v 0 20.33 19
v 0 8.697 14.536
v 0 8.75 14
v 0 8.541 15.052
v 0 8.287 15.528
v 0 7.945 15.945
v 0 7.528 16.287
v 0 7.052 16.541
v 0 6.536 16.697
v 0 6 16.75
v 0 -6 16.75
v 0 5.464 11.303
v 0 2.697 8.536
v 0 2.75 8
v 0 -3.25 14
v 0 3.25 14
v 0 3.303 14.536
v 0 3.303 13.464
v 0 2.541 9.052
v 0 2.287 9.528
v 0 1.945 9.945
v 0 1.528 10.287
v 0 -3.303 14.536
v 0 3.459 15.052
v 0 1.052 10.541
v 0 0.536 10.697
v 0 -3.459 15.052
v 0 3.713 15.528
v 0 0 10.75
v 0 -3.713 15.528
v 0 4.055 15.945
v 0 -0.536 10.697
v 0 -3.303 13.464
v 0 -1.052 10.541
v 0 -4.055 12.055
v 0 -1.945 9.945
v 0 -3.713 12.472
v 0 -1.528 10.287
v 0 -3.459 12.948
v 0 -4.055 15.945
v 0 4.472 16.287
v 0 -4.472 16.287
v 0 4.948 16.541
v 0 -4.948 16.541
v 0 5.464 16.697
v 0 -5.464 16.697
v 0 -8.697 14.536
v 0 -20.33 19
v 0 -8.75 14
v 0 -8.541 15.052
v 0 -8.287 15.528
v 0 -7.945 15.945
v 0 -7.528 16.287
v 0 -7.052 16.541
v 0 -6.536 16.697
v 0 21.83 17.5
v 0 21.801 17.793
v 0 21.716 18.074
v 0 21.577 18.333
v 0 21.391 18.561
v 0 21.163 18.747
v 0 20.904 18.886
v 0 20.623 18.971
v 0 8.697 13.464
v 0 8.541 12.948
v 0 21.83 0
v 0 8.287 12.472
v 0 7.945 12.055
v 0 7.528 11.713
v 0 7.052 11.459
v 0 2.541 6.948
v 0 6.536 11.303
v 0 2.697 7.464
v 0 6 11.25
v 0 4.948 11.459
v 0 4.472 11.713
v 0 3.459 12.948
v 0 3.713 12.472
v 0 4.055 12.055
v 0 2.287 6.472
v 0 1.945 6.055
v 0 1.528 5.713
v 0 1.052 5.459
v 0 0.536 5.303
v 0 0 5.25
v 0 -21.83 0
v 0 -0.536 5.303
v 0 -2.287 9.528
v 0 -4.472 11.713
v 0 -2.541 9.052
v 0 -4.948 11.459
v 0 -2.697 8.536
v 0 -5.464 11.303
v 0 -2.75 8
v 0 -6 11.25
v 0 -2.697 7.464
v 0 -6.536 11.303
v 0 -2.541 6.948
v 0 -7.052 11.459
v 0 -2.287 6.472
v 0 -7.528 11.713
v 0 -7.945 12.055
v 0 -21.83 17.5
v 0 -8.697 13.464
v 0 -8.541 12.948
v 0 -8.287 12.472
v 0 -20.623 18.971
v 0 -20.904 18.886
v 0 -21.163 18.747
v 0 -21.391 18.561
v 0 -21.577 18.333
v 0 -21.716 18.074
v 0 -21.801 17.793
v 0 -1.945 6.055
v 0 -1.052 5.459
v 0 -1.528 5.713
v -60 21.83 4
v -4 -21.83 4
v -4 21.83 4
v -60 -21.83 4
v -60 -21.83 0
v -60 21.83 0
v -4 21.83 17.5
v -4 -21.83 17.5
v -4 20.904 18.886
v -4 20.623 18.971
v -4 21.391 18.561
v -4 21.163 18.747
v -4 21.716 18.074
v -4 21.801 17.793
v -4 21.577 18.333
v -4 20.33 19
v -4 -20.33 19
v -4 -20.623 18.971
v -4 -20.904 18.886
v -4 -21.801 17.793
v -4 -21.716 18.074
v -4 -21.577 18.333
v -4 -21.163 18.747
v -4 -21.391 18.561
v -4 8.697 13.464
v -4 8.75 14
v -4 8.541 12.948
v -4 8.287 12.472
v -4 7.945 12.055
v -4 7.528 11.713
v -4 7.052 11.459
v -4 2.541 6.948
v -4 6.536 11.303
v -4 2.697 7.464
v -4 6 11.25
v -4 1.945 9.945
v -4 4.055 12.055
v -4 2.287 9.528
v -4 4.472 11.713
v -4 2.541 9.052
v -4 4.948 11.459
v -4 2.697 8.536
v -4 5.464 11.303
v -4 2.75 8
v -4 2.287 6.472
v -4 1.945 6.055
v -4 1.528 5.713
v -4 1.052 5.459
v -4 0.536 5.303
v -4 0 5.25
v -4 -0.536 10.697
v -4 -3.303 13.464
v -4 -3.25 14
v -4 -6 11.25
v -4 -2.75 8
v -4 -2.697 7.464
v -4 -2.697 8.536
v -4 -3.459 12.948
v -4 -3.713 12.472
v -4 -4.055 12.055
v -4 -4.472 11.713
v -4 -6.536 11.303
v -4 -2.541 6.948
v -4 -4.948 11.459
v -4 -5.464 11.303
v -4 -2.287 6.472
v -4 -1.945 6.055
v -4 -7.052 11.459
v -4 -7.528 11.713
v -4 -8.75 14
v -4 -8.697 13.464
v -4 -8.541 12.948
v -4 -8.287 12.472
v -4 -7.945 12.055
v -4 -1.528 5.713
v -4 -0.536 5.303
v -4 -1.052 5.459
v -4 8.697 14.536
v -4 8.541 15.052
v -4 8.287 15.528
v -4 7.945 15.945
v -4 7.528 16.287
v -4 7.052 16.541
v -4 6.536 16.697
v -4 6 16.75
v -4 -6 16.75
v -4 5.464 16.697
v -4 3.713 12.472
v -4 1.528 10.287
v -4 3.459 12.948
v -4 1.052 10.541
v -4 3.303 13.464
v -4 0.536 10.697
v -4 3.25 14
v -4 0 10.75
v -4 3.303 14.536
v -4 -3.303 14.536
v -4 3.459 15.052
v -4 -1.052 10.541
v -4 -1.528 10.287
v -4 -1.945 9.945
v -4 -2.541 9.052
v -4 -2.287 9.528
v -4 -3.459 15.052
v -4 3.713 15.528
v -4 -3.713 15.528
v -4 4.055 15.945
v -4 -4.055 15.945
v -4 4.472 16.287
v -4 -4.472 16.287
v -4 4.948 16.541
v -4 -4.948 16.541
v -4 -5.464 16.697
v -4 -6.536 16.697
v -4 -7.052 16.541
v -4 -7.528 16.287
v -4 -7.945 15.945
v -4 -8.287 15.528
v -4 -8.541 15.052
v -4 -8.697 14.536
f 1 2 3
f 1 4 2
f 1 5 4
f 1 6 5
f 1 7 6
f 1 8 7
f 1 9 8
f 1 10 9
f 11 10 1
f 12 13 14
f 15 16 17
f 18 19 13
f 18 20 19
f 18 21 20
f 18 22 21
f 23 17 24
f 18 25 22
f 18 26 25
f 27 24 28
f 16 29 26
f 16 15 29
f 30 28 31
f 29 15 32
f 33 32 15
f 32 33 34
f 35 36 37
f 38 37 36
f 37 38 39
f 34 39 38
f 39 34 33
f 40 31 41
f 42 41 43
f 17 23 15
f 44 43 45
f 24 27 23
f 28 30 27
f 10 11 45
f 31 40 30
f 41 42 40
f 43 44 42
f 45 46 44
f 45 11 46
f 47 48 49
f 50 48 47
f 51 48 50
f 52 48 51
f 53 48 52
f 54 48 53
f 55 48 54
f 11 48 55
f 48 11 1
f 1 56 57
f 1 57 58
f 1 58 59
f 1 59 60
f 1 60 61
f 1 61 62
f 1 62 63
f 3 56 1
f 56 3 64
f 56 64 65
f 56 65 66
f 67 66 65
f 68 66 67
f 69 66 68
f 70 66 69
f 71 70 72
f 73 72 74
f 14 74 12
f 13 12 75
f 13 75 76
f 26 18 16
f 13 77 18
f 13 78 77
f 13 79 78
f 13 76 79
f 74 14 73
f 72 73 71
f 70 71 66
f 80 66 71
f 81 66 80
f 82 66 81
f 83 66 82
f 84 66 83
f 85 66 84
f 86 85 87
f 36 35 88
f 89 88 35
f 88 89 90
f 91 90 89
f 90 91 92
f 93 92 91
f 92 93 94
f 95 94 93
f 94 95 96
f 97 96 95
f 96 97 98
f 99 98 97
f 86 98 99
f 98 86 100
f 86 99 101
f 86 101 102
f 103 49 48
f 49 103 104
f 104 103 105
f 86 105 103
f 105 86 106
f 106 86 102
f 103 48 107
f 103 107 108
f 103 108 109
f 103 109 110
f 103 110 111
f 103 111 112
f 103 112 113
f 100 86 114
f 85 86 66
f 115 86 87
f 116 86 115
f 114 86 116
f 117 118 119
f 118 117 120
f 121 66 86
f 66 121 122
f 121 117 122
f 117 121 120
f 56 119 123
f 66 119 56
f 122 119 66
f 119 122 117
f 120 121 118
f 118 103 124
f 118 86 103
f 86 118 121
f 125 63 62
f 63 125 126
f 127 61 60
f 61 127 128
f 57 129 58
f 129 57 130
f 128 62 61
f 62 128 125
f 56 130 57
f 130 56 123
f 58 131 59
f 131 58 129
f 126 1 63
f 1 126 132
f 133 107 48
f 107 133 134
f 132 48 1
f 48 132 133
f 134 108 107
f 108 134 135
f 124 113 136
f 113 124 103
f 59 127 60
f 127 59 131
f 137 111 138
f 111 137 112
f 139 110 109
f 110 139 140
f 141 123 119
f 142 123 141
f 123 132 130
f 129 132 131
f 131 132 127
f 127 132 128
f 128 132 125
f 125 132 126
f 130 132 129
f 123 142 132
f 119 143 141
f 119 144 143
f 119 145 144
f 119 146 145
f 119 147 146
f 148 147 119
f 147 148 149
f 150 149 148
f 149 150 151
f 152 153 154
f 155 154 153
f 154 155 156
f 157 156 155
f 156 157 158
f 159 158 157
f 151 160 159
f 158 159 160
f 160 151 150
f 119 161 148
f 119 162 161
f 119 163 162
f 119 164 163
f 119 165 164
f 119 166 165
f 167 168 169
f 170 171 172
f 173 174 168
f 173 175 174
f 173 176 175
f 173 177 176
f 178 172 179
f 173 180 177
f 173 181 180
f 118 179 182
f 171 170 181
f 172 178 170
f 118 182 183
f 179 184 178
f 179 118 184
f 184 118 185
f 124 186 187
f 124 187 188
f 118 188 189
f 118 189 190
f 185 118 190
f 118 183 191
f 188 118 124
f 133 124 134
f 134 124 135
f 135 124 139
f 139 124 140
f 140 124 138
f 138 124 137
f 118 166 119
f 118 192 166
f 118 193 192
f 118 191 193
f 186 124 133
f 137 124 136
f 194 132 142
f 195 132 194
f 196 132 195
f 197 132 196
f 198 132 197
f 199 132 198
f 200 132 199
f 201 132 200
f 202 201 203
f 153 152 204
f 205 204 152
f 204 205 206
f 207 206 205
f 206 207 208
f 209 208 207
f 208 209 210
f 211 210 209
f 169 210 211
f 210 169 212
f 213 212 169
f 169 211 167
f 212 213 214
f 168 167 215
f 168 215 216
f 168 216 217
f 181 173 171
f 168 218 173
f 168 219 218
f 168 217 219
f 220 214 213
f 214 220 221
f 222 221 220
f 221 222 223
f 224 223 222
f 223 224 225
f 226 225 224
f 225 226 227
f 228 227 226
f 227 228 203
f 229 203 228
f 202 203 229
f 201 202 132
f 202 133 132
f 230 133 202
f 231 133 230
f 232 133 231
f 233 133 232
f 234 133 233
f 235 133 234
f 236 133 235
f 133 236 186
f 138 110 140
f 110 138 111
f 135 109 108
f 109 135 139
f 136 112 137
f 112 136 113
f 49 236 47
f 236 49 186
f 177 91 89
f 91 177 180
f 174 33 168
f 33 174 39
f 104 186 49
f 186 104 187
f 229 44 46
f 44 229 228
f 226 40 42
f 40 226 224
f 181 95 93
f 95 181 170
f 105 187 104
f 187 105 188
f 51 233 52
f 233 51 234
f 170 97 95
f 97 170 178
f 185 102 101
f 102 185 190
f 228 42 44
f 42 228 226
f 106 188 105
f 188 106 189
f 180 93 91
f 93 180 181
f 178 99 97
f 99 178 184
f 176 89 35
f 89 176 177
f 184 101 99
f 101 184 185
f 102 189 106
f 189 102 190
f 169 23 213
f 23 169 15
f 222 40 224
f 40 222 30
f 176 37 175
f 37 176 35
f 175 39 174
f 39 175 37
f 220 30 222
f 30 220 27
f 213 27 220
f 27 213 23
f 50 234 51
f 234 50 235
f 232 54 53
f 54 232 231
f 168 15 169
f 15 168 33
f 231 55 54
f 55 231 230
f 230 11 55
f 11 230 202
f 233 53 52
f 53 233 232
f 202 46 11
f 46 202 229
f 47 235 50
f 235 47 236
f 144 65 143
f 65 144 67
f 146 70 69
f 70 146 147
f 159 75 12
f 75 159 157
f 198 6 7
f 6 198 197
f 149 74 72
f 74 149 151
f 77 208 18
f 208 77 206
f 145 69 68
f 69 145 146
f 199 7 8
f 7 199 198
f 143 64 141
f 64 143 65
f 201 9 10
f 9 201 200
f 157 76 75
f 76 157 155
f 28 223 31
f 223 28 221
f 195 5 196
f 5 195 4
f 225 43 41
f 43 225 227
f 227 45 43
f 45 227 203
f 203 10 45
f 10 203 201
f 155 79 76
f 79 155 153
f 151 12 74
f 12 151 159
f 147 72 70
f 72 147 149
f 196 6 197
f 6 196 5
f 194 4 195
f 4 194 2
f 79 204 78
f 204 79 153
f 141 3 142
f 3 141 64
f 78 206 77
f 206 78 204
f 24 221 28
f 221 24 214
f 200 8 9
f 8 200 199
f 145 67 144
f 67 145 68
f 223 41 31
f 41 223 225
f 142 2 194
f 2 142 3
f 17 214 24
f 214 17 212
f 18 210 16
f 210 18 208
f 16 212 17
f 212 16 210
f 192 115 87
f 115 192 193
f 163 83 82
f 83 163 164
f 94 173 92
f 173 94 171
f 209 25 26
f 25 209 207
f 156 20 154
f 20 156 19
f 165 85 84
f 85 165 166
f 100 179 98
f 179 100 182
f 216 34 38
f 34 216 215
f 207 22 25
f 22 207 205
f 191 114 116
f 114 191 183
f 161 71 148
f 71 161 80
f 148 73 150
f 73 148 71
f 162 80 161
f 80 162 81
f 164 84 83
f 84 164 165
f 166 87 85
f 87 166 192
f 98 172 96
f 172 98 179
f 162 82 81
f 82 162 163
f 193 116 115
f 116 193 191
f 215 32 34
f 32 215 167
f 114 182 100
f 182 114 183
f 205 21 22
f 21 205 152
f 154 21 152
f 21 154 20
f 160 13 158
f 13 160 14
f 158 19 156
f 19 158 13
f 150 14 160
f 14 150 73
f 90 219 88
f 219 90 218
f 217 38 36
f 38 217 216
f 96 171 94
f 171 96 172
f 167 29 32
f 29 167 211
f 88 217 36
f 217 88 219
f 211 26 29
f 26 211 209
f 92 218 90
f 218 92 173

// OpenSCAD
/**
 * Rack Scad - Joiner Examples
 *
 * Dedicated examples file for faceplate joiner brackets.
 * These brackets allow separately printed rack panels to be
 * screwed together using M5 hardware.
 *
 * Screw Pattern: Triangle layout (2 near edge, 1 further back)
 * Hardware: M5 screws (10-16mm) + M5 hex nuts
 *
 * Use the Customizer to select which example to view.
 */

use <components/joiners.scad>

/* [Example Selection] */

// Select which joiner example to display
joiner_example = 1; // [1:Single Left Bracket (1U), 2:Single Right Bracket (1U), 3:Bracket Pair (1U), 4:Assembled View (1U), 5:Exploded View (1U), 6:2U Bracket Pair, 7:2U Assembled, 8:3U Bracket Pair, 9:Bracket Only (no faceplate), 10:All Sizes Comparison, 11:Print Layout - 1U Pair, 12:Print Layout - 2U Pair]

/* [Joiner Parameters] */

// Faceplate section width (mm)
faceplate_width = 60; // [40:10:120]

// Distance from joint edge to bracket (mm)
edge_offset = 5; // [0:1:20]

// Detail level for curves
detail_fn = 32; // [16:Low, 32:Medium, 64:High]


/* [Hide] */
_dummy = 0;


// ============================================================
// EXAMPLE 1: Single Left Bracket (1U)
// The side with screw clearance holes
// ============================================================
module example_single_left_1u()
{
    color("SteelBlue")
        faceplate_joiner_left(
            unit_height = 1,
            faceplate_width = faceplate_width,
            edge_offset = edge_offset,
            include_faceplate = true,
            fn = detail_fn
        );

    // Label
    %translate([0, -35, 0])
        linear_extrude(1)
            text("LEFT (screw side)", size = 4, halign = "center");
}


// ============================================================
// EXAMPLE 2: Single Right Bracket (1U)
// The side with hex nut pockets
// ============================================================
module example_single_right_1u()
{
    color("Coral")
        faceplate_joiner_right(
            unit_height = 1,
            faceplate_width = faceplate_width,
            edge_offset = edge_offset,
            include_faceplate = true,
            fn = detail_fn
        );

    // Label
    %translate([30, -35, 0])
        linear_extrude(1)
            text("RIGHT (nut side)", size = 4, halign = "center");
}


// ============================================================
// EXAMPLE 3: Bracket Pair (1U)
// Both left and right brackets side by side
// ============================================================
module example_pair_1u()
{
    faceplate_joiner_pair(
        unit_height = 1,
        faceplate_width = faceplate_width,
        edge_offset = edge_offset,
        spacing = 15,
        fn = detail_fn
    );

    // Labels
    %translate([-faceplate_width/2 - 5, -35, 0])
        linear_extrude(1)
            text("LEFT", size = 4, halign = "center");

    %translate([faceplate_width/2 + 5, -35, 0])
        linear_extrude(1)
            text("RIGHT", size = 4, halign = "center");

    // Hardware note
    %translate([0, -45, 0])
        linear_extrude(1)
            text("Hardware: 3x M5 screws + 3x M5 hex nuts", size = 3, halign = "center");
}


// ============================================================
// EXAMPLE 4: Assembled View (1U)
// Shows how the brackets mate together
// ============================================================
module example_assembled_1u()
{
    faceplate_joiner_assembled(
        unit_height = 1,
        faceplate_width = faceplate_width,
        edge_offset = edge_offset,
        explode = 0,
        fn = detail_fn
    );

    // Label
    %translate([0, -35, 0])
        linear_extrude(1)
            text("ASSEMBLED - 1U Joint", size = 4, halign = "center");
}


// ============================================================
// EXAMPLE 5: Exploded View (1U)
// Shows assembly with parts separated
// ============================================================
module example_exploded_1u()
{
    faceplate_joiner_assembled(
        unit_height = 1,
        faceplate_width = faceplate_width,
        edge_offset = edge_offset,
        explode = 30,
        fn = detail_fn
    );

    // Assembly arrow
    %translate([0, 0, 25])
        rotate([0, 90, 0])
            cylinder(h = 20, d1 = 8, d2 = 0, center = true, $fn = 16);

    // Label
    %translate([0, -35, 0])
        linear_extrude(1)
            text("EXPLODED VIEW", size = 4, halign = "center");
}


// ============================================================
// EXAMPLE 6: 2U Bracket Pair
// Larger brackets with 6 screws (2 triangles)
// ============================================================
module example_pair_2u()
{
    faceplate_joiner_pair(
        unit_height = 2,
        faceplate_width = faceplate_width,
        edge_offset = edge_offset,
        spacing = 15,
        fn = detail_fn
    );

    // Hardware note
    %translate([0, -60, 0])
        linear_extrude(1)
            text("2U: 6x M5 screws + 6x M5 hex nuts", size = 3, halign = "center");
}


// ============================================================
// EXAMPLE 7: 2U Assembled
// Shows assembled 2U joint
// ============================================================
module example_assembled_2u()
{
    faceplate_joiner_assembled(
        unit_height = 2,
        faceplate_width = faceplate_width,
        edge_offset = edge_offset,
        explode = 0,
        fn = detail_fn
    );

    // Label
    %translate([0, -60, 0])
        linear_extrude(1)
            text("ASSEMBLED - 2U Joint", size = 4, halign = "center");
}


// ============================================================
// EXAMPLE 8: 3U Bracket Pair
// Even larger brackets with 9 screws (3 triangles)
// ============================================================
module example_pair_3u()
{
    faceplate_joiner_pair(
        unit_height = 3,
        faceplate_width = faceplate_width,
        edge_offset = edge_offset,
        spacing = 15,
        fn = detail_fn
    );

    // Hardware note
    %translate([0, -80, 0])
        linear_extrude(1)
            text("3U: 9x M5 screws + 9x M5 hex nuts", size = 3, halign = "center");
}


// ============================================================
// EXAMPLE 9: Bracket Only (no faceplate)
// Just the bracket portion for adding to existing designs
// ============================================================
module example_bracket_only()
{
    // Left bracket only
    color("SteelBlue")
        translate([-25, 0, 0])
            joiner_bracket_addon(unit_height = 1, side = "left", edge_offset = edge_offset, fn = detail_fn);

    // Right bracket only
    color("Coral")
        translate([25, 0, 0])
            joiner_bracket_addon(unit_height = 1, side = "right", edge_offset = edge_offset, fn = detail_fn);

    // Labels
    %translate([-25, -35, 0])
        linear_extrude(1)
            text("LEFT addon", size = 3, halign = "center");

    %translate([25, -35, 0])
        linear_extrude(1)
            text("RIGHT addon", size = 3, halign = "center");

    %translate([0, -45, 0])
        linear_extrude(1)
            text("Use with union() on existing faceplates", size = 3, halign = "center");
}


// ============================================================
// EXAMPLE 10: All Sizes Comparison
// 1U, 2U, and 3U brackets side by side
// ============================================================
module example_size_comparison()
{
    // 1U
    translate([0, 80, 0]) {
        faceplate_joiner_pair(unit_height = 1, faceplate_width = 50, spacing = 10, fn = detail_fn);
        %translate([0, -30, 0])
            linear_extrude(1)
                text("1U (3 screws)", size = 3, halign = "center");
    }

    // 2U
    translate([0, 0, 0]) {
        faceplate_joiner_pair(unit_height = 2, faceplate_width = 50, spacing = 10, fn = detail_fn);
        %translate([0, -55, 0])
            linear_extrude(1)
                text("2U (6 screws)", size = 3, halign = "center");
    }

    // 3U
    translate([0, -100, 0]) {
        faceplate_joiner_pair(unit_height = 3, faceplate_width = 50, spacing = 10, fn = detail_fn);
        %translate([0, -80, 0])
            linear_extrude(1)
                text("3U (9 screws)", size = 3, halign = "center");
    }
}


// ============================================================
// EXAMPLE 11: Print Layout - 1U Pair
// Optimized layout for 3D printing
// ============================================================
module example_print_layout_1u()
{
    // Parts laid flat for printing
    color("SteelBlue")
        translate([-40, 0, 0])
            faceplate_joiner_left(
                unit_height = 1,
                faceplate_width = faceplate_width,
                edge_offset = edge_offset,
                include_faceplate = true,
                fn = detail_fn
            );

    color("Coral")
        translate([40, 0, 0])
            faceplate_joiner_right(
                unit_height = 1,
                faceplate_width = faceplate_width,
                edge_offset = edge_offset,
                include_faceplate = true,
                fn = detail_fn
            );

    // Print settings note
    %translate([0, -40, 0])
        linear_extrude(1)
            text("Print Settings: 0.2mm layer, 4+ walls, 20% infill", size = 3, halign = "center");

    %translate([0, -48, 0])
        linear_extrude(1)
            text("No supports needed", size = 3, halign = "center");
}


// ============================================================
// EXAMPLE 12: Print Layout - 2U Pair
// Optimized layout for 3D printing larger brackets
// ============================================================
module example_print_layout_2u()
{
    // Parts laid flat for printing
    color("SteelBlue")
        translate([-45, 0, 0])
            faceplate_joiner_left(
                unit_height = 2,
                faceplate_width = faceplate_width,
                edge_offset = edge_offset,
                include_faceplate = true,
                fn = detail_fn
            );

    color("Coral")
        translate([45, 0, 0])
            faceplate_joiner_right(
                unit_height = 2,
                faceplate_width = faceplate_width,
                edge_offset = edge_offset,
                include_faceplate = true,
                fn = detail_fn
            );

    // Print settings note
    %translate([0, -60, 0])
        linear_extrude(1)
            text("2U Print Layout", size = 4, halign = "center");

    %translate([0, -70, 0])
        linear_extrude(1)
            text("Hardware: 6x M5x12mm screws + 6x M5 hex nuts", size = 3, halign = "center");
}


// ============================================================
// Render selected example
// ============================================================
if (joiner_example == 1) example_single_left_1u();
else if (joiner_example == 2) example_single_right_1u();
else if (joiner_example == 3) example_pair_1u();
else if (joiner_example == 4) example_assembled_1u();
else if (joiner_example == 5) example_exploded_1u();
else if (joiner_example == 6) example_pair_2u();
else if (joiner_example == 7) example_assembled_2u();
else if (joiner_example == 8) example_pair_3u();
else if (joiner_example == 9) example_bracket_only();
else if (joiner_example == 10) example_size_comparison();
else if (joiner_example == 11) example_print_layout_1u();
else if (joiner_example == 12) example_print_layout_2u();
